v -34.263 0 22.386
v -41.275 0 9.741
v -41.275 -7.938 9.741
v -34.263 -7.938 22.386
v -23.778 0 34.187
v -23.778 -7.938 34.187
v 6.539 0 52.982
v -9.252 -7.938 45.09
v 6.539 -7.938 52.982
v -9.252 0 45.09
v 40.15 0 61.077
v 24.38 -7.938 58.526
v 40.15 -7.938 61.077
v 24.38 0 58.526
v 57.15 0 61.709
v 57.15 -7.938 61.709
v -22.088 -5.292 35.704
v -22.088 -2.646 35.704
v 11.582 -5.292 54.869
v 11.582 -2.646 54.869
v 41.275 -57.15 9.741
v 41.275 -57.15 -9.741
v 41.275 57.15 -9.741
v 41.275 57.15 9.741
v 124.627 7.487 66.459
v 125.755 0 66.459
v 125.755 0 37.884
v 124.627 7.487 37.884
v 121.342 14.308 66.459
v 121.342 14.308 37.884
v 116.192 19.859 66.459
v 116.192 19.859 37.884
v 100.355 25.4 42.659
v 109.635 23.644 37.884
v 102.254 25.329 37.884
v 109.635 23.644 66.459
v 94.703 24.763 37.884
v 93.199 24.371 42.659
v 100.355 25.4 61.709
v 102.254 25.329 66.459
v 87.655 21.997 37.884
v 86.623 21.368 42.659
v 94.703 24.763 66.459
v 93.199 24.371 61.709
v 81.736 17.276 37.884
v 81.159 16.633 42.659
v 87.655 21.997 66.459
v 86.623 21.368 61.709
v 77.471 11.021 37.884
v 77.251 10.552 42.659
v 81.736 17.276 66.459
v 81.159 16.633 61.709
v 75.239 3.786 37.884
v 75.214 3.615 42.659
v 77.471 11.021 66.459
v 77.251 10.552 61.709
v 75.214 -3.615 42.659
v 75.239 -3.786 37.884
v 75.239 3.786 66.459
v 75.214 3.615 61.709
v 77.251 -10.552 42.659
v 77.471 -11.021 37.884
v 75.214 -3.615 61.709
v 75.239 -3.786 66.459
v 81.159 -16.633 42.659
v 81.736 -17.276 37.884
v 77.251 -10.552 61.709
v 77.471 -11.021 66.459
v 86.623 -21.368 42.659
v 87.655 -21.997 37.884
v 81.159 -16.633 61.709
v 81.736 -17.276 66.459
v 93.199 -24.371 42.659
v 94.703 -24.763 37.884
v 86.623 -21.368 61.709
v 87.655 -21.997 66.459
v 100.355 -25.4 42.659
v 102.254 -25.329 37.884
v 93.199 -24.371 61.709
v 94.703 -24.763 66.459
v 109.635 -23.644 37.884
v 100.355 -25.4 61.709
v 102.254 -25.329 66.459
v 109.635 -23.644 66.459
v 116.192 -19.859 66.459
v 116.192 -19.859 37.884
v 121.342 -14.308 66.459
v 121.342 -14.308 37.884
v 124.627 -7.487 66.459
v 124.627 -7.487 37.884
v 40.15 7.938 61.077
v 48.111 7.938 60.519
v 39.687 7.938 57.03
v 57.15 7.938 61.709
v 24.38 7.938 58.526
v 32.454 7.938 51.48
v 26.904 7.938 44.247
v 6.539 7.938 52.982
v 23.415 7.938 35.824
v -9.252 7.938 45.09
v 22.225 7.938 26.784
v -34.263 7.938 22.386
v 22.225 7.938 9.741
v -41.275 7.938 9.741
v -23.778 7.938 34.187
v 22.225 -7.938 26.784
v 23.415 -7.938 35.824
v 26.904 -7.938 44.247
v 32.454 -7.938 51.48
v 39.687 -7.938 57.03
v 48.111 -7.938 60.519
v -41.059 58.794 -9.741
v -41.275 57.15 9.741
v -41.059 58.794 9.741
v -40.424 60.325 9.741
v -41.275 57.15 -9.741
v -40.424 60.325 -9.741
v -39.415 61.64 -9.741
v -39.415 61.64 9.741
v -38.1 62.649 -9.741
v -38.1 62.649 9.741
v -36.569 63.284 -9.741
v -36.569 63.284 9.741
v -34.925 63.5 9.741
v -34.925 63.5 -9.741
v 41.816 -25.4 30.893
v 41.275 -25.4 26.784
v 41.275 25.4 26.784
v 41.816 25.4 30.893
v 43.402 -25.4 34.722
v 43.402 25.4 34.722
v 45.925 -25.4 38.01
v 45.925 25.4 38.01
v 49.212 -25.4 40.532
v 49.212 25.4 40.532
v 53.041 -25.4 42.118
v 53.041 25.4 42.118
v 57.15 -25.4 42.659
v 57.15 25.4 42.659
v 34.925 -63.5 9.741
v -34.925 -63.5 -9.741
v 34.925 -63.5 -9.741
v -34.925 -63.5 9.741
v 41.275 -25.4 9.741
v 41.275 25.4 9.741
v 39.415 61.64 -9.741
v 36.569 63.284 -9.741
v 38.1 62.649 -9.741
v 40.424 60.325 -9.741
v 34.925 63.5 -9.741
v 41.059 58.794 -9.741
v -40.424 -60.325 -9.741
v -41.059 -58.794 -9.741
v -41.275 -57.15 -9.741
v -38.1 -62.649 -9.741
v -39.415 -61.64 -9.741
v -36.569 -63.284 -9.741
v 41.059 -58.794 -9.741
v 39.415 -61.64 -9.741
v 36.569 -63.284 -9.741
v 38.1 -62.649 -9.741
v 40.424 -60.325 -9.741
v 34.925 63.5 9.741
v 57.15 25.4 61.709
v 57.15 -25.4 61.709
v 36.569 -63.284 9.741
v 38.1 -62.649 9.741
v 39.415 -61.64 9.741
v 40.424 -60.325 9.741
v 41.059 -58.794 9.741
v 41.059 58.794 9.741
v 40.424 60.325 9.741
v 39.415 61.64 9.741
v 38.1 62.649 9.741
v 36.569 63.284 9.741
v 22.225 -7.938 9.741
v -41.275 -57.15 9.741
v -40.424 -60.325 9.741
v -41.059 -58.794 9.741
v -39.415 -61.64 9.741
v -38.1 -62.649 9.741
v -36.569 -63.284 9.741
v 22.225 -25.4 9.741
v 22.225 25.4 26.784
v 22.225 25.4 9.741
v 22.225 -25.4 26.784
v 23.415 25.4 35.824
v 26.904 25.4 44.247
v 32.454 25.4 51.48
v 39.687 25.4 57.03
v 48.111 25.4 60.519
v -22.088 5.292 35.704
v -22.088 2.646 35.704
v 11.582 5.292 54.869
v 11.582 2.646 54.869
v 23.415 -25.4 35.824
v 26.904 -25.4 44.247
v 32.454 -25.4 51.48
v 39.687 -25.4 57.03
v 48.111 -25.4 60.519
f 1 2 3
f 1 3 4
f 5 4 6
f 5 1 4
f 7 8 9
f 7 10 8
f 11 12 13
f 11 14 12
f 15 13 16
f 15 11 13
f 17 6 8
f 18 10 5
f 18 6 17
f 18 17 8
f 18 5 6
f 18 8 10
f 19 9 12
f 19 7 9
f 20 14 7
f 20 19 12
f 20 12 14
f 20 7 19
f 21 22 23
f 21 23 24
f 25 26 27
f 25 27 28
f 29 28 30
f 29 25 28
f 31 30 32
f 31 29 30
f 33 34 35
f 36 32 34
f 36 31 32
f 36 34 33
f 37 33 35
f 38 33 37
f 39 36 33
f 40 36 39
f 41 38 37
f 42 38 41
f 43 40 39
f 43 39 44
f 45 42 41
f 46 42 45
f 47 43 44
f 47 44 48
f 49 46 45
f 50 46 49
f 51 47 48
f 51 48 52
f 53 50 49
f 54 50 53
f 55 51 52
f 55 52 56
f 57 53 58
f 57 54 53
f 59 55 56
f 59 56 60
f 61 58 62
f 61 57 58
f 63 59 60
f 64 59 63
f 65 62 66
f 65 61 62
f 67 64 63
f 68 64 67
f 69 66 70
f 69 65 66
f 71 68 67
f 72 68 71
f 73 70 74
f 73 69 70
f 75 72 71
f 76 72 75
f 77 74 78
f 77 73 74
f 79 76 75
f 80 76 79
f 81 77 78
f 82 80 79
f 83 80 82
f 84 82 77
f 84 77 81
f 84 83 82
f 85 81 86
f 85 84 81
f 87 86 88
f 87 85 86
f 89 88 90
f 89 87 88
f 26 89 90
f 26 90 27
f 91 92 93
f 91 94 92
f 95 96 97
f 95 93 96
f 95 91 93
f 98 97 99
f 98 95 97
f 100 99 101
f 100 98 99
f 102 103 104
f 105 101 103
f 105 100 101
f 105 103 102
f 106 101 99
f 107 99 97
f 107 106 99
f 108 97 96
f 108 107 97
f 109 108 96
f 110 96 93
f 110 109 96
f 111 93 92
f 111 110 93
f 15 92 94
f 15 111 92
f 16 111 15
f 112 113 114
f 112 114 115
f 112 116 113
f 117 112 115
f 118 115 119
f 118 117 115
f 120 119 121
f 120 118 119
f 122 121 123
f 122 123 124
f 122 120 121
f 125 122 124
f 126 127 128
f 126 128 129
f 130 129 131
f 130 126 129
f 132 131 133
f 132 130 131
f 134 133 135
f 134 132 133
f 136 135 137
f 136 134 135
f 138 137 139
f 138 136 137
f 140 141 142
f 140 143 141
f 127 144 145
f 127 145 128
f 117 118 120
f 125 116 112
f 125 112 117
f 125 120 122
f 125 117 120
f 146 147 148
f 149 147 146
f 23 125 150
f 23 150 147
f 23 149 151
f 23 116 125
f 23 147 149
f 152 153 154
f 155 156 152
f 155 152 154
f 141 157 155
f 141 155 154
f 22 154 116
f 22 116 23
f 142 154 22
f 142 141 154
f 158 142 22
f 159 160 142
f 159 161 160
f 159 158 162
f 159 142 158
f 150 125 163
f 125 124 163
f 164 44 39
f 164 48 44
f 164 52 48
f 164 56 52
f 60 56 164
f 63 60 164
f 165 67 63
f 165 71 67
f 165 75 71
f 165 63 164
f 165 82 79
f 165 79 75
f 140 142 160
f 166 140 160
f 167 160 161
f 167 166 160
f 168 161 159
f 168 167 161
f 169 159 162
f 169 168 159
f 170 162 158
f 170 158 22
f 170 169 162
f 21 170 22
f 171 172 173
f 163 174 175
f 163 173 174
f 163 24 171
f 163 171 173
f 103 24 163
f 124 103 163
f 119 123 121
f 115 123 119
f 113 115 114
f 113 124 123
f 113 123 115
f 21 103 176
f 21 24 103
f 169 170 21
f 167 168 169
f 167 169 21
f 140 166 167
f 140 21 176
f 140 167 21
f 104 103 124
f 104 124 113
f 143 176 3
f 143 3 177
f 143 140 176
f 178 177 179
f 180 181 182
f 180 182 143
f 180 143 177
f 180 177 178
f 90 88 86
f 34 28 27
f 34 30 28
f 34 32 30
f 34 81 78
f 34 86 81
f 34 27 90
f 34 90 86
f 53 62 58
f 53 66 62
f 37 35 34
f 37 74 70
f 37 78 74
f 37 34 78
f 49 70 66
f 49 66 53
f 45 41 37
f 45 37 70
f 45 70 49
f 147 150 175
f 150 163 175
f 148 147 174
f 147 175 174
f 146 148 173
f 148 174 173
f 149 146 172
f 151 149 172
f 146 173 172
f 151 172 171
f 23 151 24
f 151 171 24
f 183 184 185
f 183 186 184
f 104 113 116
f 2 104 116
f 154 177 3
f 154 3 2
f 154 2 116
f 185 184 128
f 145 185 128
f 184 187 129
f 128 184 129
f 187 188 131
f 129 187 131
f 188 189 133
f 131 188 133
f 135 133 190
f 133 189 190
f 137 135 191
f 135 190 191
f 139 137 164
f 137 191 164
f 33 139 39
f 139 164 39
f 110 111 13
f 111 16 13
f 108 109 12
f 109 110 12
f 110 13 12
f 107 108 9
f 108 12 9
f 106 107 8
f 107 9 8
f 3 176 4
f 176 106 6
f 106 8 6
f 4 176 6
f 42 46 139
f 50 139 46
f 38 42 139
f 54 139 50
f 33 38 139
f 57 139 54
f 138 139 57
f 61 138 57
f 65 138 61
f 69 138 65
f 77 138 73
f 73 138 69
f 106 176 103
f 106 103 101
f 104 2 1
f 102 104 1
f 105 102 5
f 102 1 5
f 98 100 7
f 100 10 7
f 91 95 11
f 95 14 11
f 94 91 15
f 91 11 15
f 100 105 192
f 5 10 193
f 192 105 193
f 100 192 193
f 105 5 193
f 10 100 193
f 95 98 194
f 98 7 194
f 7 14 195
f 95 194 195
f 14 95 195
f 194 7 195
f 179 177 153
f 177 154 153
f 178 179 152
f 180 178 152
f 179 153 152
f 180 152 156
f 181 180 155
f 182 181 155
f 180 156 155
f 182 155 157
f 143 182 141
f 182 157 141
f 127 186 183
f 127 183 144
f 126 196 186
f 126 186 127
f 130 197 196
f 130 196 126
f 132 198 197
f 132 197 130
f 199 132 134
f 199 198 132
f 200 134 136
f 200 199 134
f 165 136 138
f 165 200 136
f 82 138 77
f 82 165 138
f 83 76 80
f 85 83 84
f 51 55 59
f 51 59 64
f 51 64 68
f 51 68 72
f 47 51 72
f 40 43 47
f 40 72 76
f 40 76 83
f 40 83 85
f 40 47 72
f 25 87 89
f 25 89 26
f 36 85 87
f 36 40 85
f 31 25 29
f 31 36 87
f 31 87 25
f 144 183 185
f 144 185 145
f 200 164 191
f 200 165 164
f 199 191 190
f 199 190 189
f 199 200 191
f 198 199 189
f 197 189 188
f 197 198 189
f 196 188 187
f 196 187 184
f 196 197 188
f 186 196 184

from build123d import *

# Parameters (mm, degrees)
F1_DEPTH = 63.5
F0_W     = 25.4
F0_H     = 19.05
F2_DEPTH = 25.4
F3_DEPTH = 7.9375
F5_R     = 6.35


with BuildPart() as f1:
    # F0 (on Front) → F1 (new body, symmetric)
    with BuildSketch(Plane.XZ):
        Polygon((22.225, 9.7409027457), (-41.275, 9.7409027457), (-41.275, -9.7409027457), (41.275, -9.7409027457), (41.275, 9.7409027457), align=None)
    extrude(amount=F1_DEPTH, both=True)

    # F0 (on Front) → F3 (join, symmetric)
    with BuildSketch(Plane.XZ):
        with BuildLine():
            add(Edge.make_bspline(
                [(-41.275, 9.7409027457), (-30.1918908954, 37.2608341277), (6.4949910156, 62.8735125065), (57.15, 61.7092972543)],
                knots=[0, 0, 0, 0, 111.3022670605, 111.3022670605, 111.3022670605, 111.3022670605], degree=3))
            Line((-41.275, 9.7409027457), (22.225, 9.7409027457))
            Line((22.225, 9.7409027457), (22.225, 26.7842972543))
            ThreePointArc((22.225, 26.7842972543), (32.4542956671, 51.4800015873), (57.15, 61.7092972543))
        make_face()
    extrude(amount=F3_DEPTH, both=True)

    # F5
    f5_edges = [f1.edges().sort_by_distance(p)[0] for p in [
        (-41.275, -63.5, 0),
        (41.275, -63.5, 0),
        (41.275, 63.5, 0),
        (-41.275, 63.5, 0),
    ]]
    fillet(f5_edges, radius=F5_R)


with BuildPart() as f2:
    # F0 (on Front) → F2 (new body, symmetric)
    with BuildSketch(Plane.XZ):
        with BuildLine():
            Line((22.225, 26.7842972543), (22.225, 9.7409027457))
            Line((22.225, 9.7409027457), (41.275, 9.7409027457))
            Line((41.275, 9.7409027457), (41.275, 26.7842972543))
            ThreePointArc((41.275, 26.7842972543), (45.9246798487, 38.0096174057), (57.15, 42.6592972543))
            Line((57.15, 42.6592972543), (74.9554038295, 42.6592972543))
            Line((74.9554038295, 42.6592972543), (74.9554038295, 61.7092972543))
            Line((74.9554038295, 61.7092972543), (57.15, 61.7092972543))
            ThreePointArc((57.15, 61.7092972543), (32.4542956671, 51.4800015873), (22.225, 26.7842972543))
        make_face()
        with Locations((87.6554038295, 52.1842972543)):
            Rectangle(F0_W, F0_H)
    extrude(amount=F2_DEPTH, both=True)

    # F0 (on Front) → F4 (revolve)
    with BuildSketch(Plane.XZ):
        Polygon((100.3554038295, 66.4590972543), (100.3554038295, 61.7092972543), (100.3554038295, 42.6592972543), (100.3554038295, 37.8840972543), (125.7554038295, 37.8840972543), (125.7554038295, 66.4590972543), align=None)
    revolve(axis=Axis((100.3554038295, 0, 52.1715972543), (0, 0, 1)))


solid = Compound([f1.part, f2.part])
